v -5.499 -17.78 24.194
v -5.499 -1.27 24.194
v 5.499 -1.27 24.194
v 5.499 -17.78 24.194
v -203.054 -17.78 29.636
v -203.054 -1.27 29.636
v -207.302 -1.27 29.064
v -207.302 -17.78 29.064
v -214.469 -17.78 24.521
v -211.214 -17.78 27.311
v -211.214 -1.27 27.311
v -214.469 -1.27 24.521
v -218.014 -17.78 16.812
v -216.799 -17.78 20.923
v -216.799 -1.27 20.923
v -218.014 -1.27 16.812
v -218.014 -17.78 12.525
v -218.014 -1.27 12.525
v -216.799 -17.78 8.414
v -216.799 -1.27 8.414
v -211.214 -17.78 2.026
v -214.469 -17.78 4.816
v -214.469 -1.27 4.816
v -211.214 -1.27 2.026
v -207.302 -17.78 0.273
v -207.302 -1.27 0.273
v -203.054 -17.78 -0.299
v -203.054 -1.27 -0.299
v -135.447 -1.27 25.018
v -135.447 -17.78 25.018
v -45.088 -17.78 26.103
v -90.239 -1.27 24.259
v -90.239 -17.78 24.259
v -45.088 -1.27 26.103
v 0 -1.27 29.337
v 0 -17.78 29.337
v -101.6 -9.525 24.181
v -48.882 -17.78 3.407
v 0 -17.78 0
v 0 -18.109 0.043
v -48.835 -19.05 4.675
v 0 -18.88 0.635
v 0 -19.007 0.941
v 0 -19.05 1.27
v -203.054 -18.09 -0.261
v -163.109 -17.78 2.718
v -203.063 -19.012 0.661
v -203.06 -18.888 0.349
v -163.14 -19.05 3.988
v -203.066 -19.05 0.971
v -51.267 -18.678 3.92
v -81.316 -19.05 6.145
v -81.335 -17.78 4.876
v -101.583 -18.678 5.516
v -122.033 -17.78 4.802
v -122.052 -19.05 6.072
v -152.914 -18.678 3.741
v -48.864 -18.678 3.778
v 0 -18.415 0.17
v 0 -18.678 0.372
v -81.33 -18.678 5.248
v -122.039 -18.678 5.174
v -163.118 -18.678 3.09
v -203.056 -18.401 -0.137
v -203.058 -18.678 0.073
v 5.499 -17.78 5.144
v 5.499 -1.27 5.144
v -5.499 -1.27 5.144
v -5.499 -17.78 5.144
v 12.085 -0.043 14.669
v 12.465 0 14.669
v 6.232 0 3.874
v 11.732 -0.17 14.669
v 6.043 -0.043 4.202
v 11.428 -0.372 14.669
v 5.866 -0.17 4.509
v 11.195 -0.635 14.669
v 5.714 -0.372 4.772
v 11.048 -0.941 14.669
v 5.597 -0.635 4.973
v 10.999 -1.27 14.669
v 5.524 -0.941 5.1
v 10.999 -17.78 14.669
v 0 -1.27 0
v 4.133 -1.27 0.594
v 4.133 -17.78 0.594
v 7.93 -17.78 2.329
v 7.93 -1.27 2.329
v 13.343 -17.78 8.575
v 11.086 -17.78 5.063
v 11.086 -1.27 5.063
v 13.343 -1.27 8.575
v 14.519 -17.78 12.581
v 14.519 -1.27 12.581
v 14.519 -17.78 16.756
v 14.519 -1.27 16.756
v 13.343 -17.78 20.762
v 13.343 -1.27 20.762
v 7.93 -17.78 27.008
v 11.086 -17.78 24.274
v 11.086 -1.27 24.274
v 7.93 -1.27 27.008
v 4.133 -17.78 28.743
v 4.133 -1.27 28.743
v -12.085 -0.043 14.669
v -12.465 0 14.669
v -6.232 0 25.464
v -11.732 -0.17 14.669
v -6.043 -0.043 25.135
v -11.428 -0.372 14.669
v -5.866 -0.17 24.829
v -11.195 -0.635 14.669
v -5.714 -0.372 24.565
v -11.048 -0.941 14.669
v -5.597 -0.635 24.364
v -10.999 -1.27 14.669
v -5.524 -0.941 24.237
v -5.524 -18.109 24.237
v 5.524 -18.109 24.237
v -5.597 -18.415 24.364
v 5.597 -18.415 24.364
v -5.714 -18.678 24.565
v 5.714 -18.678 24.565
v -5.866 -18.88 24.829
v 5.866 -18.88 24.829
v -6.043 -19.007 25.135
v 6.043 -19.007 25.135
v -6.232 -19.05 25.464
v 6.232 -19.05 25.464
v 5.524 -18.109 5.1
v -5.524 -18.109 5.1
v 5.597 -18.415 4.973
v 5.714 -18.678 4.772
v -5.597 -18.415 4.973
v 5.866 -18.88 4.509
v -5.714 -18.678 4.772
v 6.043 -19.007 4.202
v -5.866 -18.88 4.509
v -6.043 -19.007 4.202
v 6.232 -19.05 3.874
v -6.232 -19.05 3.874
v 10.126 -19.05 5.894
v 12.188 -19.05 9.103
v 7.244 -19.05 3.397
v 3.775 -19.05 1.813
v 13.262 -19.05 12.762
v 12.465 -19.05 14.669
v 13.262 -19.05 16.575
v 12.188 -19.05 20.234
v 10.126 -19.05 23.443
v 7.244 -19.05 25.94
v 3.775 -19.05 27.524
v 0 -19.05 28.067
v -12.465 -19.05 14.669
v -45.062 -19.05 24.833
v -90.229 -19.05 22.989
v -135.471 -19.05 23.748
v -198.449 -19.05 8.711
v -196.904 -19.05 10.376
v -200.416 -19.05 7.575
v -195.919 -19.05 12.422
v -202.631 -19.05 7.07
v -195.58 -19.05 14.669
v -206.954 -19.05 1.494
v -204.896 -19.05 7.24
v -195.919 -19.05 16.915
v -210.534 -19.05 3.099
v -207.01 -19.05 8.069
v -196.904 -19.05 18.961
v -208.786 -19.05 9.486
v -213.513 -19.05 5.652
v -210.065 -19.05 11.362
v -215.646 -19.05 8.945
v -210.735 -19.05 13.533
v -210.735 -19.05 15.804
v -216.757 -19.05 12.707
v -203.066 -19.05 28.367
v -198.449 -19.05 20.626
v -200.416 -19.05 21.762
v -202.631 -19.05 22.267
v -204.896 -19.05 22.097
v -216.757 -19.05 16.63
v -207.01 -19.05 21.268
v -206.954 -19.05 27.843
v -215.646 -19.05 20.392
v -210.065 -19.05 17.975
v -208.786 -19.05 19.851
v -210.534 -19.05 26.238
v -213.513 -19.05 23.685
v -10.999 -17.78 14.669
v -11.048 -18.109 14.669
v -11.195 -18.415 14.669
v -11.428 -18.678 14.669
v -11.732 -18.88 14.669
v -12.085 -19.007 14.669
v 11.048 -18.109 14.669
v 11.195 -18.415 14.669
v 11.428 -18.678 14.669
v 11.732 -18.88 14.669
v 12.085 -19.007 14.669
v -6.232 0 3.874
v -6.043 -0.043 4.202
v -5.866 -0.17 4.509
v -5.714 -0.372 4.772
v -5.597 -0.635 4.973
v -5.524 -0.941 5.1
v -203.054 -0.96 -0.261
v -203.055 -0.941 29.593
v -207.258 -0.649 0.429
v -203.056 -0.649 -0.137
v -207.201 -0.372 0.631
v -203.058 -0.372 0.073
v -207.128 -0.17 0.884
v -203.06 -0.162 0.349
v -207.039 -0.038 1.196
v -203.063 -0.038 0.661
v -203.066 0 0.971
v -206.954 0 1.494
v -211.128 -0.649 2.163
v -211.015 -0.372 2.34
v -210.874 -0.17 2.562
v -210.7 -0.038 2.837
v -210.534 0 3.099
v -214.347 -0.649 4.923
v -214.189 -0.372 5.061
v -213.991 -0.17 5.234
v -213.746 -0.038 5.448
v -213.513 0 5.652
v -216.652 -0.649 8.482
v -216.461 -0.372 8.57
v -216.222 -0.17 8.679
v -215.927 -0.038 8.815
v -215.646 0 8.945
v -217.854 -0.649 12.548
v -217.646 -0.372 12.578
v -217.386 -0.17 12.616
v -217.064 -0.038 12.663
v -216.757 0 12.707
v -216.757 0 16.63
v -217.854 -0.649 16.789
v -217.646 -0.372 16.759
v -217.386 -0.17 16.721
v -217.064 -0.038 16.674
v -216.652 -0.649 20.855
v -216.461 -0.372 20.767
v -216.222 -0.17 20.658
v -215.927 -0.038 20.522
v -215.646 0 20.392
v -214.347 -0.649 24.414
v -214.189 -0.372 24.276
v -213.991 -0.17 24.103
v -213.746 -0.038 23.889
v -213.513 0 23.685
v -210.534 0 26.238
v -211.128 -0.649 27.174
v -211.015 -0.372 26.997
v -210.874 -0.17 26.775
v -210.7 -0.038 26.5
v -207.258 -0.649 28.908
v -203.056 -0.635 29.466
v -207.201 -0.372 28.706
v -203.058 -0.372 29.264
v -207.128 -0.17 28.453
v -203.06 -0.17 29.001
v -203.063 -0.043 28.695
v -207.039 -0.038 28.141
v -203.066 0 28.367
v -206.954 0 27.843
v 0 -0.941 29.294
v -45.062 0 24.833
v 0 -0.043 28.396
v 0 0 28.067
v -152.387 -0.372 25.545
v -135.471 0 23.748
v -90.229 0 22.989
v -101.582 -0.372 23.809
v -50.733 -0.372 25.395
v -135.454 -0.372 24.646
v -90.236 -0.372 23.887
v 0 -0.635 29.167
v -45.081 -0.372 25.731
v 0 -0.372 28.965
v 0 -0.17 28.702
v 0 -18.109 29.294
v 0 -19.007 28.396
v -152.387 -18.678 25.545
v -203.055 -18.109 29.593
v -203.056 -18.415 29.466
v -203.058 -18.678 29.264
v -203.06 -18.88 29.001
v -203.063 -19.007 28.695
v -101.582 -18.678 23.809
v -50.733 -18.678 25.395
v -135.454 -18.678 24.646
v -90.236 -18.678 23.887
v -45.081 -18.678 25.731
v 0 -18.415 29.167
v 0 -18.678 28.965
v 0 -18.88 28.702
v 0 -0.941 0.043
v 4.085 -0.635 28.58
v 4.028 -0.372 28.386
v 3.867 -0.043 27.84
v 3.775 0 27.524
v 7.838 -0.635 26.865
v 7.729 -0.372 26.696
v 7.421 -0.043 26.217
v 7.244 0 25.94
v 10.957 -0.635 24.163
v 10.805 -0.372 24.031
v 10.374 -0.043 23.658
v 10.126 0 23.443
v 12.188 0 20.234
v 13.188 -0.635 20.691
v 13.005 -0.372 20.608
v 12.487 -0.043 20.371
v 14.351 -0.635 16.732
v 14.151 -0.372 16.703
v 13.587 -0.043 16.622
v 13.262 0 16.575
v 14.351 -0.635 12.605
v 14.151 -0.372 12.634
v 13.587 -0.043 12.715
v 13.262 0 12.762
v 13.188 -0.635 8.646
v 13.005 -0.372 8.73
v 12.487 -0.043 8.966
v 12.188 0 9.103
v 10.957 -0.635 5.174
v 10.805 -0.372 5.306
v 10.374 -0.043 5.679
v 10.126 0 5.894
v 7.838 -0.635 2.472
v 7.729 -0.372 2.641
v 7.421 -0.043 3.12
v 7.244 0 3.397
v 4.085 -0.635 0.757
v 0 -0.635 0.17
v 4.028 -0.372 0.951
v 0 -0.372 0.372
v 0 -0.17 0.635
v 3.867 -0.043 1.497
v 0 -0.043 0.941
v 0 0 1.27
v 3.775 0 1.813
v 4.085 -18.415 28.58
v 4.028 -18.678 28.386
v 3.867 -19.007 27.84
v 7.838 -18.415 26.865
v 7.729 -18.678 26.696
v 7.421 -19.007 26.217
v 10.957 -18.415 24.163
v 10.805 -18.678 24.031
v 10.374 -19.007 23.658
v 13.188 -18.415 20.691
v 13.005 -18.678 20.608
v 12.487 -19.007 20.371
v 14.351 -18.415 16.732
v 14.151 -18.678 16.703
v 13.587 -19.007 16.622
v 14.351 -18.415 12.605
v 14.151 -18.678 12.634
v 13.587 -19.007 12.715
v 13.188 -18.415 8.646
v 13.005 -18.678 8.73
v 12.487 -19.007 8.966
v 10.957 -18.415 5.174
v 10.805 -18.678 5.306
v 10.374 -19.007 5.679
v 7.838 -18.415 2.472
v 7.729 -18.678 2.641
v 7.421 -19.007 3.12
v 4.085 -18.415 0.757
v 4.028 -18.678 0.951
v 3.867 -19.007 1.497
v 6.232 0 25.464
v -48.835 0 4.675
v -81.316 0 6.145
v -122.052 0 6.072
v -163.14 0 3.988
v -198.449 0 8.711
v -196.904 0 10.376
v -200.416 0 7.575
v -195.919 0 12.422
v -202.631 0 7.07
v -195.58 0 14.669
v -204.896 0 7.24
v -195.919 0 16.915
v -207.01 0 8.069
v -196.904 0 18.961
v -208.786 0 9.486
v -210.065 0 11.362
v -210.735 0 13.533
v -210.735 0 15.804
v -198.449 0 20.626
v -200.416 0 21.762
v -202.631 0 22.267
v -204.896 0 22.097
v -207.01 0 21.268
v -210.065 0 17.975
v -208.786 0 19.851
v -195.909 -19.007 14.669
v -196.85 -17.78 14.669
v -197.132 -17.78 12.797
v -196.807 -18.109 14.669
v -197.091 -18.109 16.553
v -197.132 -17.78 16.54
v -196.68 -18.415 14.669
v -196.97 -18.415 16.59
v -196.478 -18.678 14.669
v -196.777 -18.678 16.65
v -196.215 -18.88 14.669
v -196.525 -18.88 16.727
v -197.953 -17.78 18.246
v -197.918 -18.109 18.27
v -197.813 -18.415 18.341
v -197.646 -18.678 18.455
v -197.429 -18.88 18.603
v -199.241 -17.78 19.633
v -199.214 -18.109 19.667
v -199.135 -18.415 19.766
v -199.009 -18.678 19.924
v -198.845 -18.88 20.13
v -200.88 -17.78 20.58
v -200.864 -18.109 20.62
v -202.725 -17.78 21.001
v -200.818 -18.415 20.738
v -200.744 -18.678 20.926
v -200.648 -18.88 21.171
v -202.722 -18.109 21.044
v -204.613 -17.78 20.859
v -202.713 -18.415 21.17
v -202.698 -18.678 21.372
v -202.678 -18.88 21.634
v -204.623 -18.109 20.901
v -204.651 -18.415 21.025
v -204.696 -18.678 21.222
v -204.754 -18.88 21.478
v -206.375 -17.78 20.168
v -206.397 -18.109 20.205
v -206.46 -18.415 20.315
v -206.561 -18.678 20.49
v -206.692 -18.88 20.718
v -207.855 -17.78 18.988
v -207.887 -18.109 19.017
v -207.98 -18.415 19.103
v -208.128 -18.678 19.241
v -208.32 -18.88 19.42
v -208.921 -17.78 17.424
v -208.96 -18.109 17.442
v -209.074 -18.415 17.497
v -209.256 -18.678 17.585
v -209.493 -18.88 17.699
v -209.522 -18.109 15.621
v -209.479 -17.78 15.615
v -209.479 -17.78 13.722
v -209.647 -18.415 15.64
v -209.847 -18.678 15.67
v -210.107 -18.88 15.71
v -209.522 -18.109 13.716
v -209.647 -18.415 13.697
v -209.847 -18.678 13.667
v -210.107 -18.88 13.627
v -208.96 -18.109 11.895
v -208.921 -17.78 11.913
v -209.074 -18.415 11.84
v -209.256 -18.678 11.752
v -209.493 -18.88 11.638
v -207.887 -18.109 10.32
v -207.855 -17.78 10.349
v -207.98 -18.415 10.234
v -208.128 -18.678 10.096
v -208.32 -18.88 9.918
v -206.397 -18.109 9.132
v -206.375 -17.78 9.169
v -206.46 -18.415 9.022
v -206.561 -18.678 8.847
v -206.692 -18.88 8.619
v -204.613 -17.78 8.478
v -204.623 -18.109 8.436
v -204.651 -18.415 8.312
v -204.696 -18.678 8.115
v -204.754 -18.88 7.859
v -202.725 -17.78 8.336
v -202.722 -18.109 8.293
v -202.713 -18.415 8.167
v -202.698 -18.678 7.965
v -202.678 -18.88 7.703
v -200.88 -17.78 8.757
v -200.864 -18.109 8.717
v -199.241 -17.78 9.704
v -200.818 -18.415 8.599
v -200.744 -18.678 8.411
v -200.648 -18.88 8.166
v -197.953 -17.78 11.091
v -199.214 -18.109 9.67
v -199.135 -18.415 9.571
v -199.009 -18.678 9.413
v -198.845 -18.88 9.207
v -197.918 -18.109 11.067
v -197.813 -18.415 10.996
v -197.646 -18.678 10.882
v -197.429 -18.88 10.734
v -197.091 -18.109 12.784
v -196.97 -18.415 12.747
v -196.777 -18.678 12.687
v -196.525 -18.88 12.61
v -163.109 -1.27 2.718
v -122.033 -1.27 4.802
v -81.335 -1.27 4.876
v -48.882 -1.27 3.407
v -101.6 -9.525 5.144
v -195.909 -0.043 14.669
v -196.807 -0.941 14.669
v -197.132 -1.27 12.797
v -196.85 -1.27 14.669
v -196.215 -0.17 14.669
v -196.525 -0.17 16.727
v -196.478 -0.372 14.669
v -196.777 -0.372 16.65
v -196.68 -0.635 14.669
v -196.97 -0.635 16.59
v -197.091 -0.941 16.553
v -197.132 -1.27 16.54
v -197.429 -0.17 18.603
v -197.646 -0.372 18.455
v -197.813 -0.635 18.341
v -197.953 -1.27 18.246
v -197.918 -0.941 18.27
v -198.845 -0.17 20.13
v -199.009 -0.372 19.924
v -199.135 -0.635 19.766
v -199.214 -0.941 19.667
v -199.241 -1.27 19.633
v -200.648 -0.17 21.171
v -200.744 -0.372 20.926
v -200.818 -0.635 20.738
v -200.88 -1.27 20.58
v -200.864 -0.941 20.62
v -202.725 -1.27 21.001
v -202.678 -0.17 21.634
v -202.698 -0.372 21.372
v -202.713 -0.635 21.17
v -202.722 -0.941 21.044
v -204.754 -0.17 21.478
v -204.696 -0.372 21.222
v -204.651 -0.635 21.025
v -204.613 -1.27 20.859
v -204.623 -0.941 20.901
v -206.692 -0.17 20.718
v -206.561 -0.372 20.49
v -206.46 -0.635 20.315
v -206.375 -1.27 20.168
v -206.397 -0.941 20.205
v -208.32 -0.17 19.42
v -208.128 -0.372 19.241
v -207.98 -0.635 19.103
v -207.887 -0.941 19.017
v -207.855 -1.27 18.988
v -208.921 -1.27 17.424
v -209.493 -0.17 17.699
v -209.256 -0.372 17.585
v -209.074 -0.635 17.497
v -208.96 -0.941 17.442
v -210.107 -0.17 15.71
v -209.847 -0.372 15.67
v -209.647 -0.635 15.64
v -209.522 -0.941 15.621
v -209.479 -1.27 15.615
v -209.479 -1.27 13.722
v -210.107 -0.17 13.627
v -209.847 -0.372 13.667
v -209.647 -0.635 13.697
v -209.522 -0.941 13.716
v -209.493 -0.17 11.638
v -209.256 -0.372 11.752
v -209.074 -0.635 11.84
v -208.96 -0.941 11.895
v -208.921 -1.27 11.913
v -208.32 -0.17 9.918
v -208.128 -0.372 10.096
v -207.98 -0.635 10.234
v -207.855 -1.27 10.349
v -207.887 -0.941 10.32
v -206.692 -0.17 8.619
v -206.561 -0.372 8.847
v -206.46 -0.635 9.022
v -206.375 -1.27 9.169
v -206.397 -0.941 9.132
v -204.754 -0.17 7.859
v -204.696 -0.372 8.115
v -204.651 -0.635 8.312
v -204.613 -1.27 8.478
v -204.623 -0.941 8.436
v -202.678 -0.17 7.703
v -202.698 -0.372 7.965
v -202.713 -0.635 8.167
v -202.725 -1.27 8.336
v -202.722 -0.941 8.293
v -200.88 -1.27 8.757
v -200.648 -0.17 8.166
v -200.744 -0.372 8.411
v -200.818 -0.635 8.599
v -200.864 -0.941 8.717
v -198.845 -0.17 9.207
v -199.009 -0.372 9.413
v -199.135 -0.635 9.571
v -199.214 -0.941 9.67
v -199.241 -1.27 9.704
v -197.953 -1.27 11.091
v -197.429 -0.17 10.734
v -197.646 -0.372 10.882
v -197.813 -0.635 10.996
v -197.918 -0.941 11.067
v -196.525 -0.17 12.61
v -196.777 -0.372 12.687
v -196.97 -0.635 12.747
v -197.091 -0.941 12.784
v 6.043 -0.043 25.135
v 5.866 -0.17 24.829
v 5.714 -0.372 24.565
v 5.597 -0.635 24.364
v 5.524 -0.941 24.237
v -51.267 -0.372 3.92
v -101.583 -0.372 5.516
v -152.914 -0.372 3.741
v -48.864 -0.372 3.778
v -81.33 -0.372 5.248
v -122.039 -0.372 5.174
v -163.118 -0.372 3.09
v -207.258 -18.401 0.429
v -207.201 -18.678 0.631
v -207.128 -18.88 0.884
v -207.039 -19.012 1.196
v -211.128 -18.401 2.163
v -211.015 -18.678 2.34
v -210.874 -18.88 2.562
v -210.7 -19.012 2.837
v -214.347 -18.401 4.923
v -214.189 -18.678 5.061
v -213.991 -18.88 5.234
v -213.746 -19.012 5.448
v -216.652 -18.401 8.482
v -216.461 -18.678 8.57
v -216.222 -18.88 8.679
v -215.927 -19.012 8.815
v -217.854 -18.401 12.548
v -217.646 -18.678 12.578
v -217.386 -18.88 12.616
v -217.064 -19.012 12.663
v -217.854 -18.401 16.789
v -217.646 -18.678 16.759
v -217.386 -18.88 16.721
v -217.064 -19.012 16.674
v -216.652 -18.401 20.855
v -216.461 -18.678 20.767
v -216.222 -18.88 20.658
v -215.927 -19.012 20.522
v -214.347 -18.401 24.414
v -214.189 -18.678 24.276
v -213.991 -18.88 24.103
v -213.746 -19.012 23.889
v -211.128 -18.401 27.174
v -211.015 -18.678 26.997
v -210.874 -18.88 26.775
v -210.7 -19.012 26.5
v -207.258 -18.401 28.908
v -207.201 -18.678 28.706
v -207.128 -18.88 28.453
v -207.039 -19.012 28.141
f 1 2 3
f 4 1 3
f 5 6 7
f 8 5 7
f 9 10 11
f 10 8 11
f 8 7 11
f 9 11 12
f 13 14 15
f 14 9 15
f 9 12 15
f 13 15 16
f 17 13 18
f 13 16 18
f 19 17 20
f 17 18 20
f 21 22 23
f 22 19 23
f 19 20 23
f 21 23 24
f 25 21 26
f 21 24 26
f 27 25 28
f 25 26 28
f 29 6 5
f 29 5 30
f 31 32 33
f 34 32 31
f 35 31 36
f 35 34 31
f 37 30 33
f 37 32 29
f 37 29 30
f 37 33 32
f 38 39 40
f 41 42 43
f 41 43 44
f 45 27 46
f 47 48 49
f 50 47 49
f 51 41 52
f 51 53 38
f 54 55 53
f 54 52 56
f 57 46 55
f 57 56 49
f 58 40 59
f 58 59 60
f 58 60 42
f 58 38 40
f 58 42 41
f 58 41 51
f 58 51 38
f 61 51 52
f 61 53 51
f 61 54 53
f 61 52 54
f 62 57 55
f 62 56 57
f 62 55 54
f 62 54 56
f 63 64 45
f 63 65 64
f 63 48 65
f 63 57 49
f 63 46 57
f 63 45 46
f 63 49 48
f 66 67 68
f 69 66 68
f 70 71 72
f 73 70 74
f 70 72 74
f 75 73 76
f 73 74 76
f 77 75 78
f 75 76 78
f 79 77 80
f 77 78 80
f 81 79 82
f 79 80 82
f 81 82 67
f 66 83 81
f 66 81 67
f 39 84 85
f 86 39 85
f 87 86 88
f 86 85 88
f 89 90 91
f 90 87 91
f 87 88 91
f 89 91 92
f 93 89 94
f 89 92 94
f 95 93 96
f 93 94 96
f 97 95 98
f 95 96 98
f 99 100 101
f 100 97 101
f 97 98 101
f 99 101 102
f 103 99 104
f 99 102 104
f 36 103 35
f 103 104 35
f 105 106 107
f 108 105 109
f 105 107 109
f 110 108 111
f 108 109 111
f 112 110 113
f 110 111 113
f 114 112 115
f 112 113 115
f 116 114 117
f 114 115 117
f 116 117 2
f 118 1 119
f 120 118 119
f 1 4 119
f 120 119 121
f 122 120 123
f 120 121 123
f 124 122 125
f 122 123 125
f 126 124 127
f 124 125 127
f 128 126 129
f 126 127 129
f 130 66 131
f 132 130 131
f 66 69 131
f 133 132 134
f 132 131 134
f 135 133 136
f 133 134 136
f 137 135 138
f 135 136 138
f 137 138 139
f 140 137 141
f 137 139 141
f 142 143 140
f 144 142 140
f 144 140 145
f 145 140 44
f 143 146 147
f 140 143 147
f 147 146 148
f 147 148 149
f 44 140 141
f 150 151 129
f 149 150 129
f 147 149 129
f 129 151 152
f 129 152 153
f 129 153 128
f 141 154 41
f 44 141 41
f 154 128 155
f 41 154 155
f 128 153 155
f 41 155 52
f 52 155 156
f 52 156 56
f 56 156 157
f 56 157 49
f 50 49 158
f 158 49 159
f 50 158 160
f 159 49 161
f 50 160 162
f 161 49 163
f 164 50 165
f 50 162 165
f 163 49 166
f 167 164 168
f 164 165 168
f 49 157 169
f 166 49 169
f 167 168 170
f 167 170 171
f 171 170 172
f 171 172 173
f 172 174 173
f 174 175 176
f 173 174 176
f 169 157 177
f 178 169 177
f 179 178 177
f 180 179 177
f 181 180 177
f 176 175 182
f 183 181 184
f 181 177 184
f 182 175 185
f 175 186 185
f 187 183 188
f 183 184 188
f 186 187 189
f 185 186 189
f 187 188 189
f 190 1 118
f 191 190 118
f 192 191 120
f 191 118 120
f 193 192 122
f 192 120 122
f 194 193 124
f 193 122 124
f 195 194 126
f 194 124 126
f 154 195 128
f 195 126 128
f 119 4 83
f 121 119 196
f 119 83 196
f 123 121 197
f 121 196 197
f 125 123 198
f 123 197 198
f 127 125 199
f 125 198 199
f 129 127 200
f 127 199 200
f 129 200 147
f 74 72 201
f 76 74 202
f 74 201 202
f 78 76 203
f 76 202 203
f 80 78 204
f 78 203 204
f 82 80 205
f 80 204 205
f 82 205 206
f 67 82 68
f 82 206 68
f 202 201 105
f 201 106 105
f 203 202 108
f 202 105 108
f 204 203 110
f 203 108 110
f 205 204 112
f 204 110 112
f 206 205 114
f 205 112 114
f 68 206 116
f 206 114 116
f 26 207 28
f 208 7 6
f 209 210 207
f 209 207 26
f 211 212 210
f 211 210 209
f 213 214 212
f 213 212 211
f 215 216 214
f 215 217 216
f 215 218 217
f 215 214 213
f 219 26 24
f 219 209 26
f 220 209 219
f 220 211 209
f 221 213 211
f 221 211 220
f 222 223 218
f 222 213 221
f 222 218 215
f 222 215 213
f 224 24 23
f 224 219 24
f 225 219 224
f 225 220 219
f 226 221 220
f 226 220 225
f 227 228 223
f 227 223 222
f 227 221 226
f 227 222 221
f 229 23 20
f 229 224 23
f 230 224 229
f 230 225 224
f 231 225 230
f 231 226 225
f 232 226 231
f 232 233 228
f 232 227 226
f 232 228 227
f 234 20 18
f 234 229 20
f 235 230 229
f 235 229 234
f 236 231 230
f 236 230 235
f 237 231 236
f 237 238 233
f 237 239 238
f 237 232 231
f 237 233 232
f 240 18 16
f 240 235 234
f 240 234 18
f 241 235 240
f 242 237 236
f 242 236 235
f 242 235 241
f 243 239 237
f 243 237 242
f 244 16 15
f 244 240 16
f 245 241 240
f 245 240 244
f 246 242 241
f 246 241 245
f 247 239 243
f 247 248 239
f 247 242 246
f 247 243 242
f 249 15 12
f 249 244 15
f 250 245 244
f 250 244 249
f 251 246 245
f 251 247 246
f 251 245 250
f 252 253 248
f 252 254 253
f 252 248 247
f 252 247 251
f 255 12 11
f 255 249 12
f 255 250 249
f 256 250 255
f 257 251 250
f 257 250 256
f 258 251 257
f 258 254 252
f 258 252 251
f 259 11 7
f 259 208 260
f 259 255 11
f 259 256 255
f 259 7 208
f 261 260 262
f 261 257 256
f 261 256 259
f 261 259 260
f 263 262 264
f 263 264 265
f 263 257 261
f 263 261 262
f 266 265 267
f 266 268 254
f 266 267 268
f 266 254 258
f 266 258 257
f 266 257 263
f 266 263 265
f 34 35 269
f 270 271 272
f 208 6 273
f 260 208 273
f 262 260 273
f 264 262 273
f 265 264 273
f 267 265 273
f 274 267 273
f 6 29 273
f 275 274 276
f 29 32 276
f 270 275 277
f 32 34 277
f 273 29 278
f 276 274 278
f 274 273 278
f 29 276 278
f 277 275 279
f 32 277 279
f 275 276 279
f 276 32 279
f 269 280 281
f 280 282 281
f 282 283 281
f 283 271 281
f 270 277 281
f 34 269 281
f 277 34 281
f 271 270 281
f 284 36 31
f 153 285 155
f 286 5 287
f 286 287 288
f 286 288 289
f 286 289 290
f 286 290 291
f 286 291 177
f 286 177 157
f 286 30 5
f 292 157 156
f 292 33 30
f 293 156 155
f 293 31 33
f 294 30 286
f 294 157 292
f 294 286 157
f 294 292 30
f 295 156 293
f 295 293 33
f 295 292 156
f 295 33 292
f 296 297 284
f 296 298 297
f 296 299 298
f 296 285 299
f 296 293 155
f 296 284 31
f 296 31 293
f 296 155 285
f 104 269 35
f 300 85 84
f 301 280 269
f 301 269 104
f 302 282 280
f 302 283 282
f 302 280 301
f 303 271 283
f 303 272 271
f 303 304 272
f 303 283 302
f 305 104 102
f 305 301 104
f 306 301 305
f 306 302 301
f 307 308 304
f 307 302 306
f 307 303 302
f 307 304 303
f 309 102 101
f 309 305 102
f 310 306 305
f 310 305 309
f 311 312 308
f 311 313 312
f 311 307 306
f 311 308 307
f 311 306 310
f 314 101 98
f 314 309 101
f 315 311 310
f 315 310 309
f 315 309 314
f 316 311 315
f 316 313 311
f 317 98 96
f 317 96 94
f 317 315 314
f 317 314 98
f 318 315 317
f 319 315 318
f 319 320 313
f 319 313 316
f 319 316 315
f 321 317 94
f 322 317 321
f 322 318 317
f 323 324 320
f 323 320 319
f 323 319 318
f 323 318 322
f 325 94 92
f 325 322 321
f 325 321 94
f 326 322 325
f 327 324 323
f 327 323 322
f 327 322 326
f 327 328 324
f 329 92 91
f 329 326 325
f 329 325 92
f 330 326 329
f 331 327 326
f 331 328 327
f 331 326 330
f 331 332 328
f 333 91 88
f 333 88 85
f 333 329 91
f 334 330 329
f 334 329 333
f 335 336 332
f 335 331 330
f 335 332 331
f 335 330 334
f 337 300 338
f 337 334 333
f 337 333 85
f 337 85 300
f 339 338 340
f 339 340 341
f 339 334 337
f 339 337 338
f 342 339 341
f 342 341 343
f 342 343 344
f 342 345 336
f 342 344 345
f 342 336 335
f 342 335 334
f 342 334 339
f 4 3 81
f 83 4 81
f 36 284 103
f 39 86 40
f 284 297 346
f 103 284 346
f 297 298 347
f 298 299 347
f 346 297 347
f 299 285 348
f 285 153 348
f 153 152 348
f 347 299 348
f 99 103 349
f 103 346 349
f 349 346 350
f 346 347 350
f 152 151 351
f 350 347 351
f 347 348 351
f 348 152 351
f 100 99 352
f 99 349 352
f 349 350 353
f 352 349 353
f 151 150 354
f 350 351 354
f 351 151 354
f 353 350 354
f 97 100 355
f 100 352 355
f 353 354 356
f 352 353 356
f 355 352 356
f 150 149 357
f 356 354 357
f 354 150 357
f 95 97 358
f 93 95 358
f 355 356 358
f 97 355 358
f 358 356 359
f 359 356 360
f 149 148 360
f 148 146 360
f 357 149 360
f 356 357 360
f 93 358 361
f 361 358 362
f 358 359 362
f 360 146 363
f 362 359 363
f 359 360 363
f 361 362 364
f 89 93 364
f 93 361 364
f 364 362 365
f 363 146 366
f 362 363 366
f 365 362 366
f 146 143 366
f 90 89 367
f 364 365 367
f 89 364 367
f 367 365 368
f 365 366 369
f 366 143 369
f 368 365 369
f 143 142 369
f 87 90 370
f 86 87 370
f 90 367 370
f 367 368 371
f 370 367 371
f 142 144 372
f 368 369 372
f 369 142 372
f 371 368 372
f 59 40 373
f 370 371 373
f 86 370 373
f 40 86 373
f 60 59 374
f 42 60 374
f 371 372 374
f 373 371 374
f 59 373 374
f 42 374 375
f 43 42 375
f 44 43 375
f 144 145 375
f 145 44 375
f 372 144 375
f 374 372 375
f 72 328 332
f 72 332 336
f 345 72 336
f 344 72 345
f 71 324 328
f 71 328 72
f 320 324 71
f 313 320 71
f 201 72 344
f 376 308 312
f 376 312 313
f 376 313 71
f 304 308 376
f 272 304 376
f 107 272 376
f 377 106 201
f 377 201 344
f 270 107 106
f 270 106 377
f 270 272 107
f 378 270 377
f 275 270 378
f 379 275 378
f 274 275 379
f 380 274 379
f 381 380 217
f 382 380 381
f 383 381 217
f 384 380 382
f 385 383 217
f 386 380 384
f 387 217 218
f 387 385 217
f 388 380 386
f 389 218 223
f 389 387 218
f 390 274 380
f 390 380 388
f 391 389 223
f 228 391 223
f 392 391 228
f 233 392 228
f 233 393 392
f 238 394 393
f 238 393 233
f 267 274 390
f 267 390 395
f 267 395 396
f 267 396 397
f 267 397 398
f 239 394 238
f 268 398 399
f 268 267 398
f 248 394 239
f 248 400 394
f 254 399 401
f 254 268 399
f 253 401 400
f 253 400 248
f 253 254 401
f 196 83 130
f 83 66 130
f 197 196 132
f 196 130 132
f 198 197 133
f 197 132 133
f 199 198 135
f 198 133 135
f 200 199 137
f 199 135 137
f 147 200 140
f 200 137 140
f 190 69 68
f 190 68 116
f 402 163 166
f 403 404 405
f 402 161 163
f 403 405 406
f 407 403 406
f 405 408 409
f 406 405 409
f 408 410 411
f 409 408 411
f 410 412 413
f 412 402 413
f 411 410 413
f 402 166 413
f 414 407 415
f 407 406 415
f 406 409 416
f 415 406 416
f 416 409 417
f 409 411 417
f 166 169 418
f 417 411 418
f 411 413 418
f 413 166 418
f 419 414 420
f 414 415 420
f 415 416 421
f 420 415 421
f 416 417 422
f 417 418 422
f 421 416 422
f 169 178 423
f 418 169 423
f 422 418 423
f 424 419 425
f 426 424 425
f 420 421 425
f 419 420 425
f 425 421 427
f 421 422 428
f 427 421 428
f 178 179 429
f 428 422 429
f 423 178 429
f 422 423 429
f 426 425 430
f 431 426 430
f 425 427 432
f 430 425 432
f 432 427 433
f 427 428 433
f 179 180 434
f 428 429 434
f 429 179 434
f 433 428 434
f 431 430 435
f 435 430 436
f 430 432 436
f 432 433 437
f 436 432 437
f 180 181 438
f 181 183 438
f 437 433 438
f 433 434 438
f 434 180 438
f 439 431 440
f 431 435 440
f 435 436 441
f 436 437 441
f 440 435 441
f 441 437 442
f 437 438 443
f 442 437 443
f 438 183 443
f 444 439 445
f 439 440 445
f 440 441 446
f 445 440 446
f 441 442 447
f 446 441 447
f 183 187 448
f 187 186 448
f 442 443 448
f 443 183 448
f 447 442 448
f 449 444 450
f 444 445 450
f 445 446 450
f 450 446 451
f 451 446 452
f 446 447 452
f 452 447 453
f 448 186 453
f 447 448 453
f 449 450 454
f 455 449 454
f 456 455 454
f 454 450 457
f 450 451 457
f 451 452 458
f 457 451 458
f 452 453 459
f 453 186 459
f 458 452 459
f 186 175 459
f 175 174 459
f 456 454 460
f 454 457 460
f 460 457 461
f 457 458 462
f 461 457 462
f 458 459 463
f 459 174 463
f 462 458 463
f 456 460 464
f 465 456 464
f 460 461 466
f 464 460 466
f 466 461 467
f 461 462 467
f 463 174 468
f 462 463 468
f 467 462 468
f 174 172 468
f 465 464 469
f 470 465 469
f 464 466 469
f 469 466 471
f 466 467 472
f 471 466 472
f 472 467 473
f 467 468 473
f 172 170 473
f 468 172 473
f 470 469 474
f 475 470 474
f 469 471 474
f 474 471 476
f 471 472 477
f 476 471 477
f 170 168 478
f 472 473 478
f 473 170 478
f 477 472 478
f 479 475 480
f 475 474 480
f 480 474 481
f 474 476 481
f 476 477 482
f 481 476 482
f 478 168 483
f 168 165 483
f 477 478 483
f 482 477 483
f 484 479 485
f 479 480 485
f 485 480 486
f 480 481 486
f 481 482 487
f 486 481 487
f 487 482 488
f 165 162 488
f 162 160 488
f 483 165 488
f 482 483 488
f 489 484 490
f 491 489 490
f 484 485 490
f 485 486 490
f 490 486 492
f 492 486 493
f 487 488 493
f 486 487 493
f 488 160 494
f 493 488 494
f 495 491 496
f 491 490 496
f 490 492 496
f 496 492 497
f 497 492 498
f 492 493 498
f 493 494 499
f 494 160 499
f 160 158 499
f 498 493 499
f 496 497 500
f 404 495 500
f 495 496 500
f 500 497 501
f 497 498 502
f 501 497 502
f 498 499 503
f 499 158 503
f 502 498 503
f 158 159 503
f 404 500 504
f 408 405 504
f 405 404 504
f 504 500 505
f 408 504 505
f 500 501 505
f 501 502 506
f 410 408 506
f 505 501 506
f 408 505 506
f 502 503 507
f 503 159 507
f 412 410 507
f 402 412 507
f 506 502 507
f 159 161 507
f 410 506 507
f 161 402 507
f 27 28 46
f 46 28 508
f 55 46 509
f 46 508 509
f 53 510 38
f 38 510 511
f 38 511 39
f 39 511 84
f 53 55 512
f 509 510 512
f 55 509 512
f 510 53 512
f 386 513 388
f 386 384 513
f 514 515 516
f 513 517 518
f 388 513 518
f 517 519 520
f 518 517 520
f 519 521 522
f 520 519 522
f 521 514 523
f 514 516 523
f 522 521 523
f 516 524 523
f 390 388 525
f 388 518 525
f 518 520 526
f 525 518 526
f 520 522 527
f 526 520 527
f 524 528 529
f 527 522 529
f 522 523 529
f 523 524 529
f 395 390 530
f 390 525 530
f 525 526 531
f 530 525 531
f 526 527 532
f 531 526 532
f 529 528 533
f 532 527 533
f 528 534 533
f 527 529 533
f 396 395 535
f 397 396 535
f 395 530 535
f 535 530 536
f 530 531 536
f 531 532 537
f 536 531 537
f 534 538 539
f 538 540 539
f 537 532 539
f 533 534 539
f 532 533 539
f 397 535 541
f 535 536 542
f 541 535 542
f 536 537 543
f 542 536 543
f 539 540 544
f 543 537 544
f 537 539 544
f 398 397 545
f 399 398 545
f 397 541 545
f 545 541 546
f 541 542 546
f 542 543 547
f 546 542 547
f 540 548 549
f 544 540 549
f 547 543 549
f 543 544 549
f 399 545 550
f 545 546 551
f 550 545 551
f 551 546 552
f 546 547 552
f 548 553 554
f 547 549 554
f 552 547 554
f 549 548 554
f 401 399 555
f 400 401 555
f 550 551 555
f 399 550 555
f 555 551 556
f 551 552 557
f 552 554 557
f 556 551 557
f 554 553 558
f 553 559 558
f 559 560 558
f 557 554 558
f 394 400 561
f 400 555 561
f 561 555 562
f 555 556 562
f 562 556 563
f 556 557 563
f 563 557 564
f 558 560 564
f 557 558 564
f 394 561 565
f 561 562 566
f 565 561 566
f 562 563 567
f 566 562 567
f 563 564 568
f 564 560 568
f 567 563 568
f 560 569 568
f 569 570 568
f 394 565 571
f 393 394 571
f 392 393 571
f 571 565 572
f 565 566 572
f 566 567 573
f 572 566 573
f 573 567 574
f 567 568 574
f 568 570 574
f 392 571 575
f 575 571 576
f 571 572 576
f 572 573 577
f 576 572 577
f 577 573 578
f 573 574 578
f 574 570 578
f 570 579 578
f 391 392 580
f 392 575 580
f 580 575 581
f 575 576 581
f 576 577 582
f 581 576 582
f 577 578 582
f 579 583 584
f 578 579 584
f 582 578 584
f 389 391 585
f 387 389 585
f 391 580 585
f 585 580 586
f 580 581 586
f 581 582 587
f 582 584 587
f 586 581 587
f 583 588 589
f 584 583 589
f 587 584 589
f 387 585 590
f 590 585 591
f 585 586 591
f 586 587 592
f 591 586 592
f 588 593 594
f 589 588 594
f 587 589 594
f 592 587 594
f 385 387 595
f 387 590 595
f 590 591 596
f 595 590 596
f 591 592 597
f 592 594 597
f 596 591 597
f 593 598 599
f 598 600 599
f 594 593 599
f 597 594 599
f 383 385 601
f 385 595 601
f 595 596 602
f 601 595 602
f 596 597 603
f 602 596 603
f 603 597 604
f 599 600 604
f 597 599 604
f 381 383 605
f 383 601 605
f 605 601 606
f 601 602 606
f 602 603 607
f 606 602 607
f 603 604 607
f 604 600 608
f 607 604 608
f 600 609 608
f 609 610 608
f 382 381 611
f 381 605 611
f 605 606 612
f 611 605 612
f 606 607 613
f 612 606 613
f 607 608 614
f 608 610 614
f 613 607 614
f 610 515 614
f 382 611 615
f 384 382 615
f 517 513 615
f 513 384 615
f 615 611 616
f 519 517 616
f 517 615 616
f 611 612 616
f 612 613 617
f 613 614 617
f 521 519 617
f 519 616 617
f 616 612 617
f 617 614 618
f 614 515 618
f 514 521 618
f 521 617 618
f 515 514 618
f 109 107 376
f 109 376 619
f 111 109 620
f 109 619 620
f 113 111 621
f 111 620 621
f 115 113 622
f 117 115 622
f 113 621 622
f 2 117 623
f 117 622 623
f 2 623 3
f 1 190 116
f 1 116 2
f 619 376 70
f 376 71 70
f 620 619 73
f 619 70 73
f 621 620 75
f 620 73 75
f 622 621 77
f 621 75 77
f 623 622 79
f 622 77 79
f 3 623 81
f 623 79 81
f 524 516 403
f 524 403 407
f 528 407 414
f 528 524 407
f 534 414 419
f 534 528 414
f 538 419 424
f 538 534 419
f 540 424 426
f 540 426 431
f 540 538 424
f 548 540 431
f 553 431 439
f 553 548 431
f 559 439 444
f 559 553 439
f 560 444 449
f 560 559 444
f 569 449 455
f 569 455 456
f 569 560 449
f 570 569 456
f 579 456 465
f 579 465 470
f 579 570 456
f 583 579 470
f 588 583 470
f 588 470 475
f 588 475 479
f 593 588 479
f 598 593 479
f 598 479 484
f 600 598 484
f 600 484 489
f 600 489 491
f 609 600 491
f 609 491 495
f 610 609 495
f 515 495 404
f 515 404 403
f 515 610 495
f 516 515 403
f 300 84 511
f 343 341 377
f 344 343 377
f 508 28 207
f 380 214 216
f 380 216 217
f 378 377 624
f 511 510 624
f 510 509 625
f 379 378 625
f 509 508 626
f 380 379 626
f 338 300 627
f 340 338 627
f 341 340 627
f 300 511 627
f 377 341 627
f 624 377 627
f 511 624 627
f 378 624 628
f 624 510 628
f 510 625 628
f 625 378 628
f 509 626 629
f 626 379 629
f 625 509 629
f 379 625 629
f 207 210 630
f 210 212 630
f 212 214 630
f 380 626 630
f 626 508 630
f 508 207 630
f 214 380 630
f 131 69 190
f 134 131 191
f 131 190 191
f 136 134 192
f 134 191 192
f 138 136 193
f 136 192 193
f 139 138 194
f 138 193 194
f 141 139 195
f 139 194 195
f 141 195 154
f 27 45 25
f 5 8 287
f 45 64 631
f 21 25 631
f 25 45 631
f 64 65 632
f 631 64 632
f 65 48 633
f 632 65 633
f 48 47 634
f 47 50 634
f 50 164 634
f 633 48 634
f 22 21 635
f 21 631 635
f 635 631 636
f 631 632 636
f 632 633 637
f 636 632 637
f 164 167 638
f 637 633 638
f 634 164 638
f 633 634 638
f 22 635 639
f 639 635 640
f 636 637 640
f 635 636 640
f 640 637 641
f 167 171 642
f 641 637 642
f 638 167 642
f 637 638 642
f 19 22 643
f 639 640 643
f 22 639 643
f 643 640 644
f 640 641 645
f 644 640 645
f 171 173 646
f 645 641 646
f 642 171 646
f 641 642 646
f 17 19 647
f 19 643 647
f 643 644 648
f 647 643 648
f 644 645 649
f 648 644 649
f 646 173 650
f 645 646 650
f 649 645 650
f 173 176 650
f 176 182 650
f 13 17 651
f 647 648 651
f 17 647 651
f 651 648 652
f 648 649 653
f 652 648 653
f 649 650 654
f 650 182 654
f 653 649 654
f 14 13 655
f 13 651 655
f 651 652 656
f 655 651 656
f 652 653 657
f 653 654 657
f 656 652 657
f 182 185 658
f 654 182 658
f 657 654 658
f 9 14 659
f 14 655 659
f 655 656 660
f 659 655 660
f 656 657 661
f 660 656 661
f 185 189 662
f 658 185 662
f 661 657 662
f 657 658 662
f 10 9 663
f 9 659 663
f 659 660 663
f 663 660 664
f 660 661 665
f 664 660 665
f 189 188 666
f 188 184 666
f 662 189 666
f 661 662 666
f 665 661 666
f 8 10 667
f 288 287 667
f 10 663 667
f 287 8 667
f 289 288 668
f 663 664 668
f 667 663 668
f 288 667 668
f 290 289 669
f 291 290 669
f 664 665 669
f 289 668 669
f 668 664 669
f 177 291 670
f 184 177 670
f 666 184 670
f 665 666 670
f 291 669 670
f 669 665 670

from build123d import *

# Parameters (mm, degrees)
F0_R     = 6.35
F1_DEPTH = 19.05
F2_R     = 1.27
F3_R     = 1.27


with BuildPart() as f1:
    # F0 (on Front) → F1 (new body)
    with BuildSketch(Plane.XZ):
        with BuildLine():
            add(Edge.make_bspline(
                [(-203.0541005576, 29.636442888), (-169.2428086843, 26.9340203064), (-101.598588578, 21.5274458219), (-33.8734169435, 26.7332782693), (0, 29.3370270495)],
                knots=[0, 0, 0, 0, 0.4998400724, 1, 1, 1, 1], degree=3))
            ThreePointArc((-203.0541005576, 29.636442888), (-218.1686404216, 14.6685135247), (-203.0541005576, -0.2994158385))
            add(Edge.make_bspline(
                [(-203.0541005576, -0.2994158385), (-170.646668192, 2.2976834728), (-100.1834122037, 7.8630302228), (-35.2998975721, 2.5504730559), (0, 0)],
                knots=[0, 0, 0, 0, 0.4998400234, 1, 1, 1, 1], degree=3))
            ThreePointArc((0, 0), (14.6685135247, 14.6685135247), (0, 29.3370270495))
        make_face()
        with Locations((-203.2, 14.6685135247)):
            Circle(F0_R, mode=Mode.SUBTRACT)
        Polygon((-10.9985226281, 14.6685135247), (-5.499261314, 24.1935135247), (5.499261314, 24.1935135247), (10.9985226281, 14.6685135247), (5.499261314, 5.1435135247), (-5.499261314, 5.1435135247), align=None, mode=Mode.SUBTRACT)
    extrude(amount=F1_DEPTH)

    # F2
    f2_edges = [f1.edges().sort_by_distance(p)[0] for p in [
        (-101.534961, -19.05, 24.180485),
        (14.668514, -19.05, 14.668514),
        (-101.535407, -19.05, 5.143633),
        (-218.16864, -19.05, 14.668514),
        (-209.55, -19.05, 14.668514),
        (0, -19.05, 5.143514),
        (8.248892, -19.05, 9.906014),
        (8.248892, -19.05, 19.431014),
        (0, -19.05, 24.193514),
        (-8.248892, -19.05, 19.431014),
        (-8.248892, -19.05, 9.906014),
    ]]
    fillet(f2_edges, radius=F2_R)

    # F3
    f3_edges = [f1.edges().sort_by_distance(p)[0] for p in [
        (-101.534961, 0, 24.180485),
        (14.668514, 0, 14.668514),
        (-101.535407, 0, 5.143633),
        (-218.16864, 0, 14.668514),
        (-209.55, 0, 14.668514),
        (0, 0, 5.143514),
        (8.248892, 0, 9.906014),
        (8.248892, 0, 19.431014),
        (0, 0, 24.193514),
        (-8.248892, 0, 19.431014),
        (-8.248892, 0, 9.906014),
    ]]
    fillet(f3_edges, radius=F3_R)


solid = f1.part
